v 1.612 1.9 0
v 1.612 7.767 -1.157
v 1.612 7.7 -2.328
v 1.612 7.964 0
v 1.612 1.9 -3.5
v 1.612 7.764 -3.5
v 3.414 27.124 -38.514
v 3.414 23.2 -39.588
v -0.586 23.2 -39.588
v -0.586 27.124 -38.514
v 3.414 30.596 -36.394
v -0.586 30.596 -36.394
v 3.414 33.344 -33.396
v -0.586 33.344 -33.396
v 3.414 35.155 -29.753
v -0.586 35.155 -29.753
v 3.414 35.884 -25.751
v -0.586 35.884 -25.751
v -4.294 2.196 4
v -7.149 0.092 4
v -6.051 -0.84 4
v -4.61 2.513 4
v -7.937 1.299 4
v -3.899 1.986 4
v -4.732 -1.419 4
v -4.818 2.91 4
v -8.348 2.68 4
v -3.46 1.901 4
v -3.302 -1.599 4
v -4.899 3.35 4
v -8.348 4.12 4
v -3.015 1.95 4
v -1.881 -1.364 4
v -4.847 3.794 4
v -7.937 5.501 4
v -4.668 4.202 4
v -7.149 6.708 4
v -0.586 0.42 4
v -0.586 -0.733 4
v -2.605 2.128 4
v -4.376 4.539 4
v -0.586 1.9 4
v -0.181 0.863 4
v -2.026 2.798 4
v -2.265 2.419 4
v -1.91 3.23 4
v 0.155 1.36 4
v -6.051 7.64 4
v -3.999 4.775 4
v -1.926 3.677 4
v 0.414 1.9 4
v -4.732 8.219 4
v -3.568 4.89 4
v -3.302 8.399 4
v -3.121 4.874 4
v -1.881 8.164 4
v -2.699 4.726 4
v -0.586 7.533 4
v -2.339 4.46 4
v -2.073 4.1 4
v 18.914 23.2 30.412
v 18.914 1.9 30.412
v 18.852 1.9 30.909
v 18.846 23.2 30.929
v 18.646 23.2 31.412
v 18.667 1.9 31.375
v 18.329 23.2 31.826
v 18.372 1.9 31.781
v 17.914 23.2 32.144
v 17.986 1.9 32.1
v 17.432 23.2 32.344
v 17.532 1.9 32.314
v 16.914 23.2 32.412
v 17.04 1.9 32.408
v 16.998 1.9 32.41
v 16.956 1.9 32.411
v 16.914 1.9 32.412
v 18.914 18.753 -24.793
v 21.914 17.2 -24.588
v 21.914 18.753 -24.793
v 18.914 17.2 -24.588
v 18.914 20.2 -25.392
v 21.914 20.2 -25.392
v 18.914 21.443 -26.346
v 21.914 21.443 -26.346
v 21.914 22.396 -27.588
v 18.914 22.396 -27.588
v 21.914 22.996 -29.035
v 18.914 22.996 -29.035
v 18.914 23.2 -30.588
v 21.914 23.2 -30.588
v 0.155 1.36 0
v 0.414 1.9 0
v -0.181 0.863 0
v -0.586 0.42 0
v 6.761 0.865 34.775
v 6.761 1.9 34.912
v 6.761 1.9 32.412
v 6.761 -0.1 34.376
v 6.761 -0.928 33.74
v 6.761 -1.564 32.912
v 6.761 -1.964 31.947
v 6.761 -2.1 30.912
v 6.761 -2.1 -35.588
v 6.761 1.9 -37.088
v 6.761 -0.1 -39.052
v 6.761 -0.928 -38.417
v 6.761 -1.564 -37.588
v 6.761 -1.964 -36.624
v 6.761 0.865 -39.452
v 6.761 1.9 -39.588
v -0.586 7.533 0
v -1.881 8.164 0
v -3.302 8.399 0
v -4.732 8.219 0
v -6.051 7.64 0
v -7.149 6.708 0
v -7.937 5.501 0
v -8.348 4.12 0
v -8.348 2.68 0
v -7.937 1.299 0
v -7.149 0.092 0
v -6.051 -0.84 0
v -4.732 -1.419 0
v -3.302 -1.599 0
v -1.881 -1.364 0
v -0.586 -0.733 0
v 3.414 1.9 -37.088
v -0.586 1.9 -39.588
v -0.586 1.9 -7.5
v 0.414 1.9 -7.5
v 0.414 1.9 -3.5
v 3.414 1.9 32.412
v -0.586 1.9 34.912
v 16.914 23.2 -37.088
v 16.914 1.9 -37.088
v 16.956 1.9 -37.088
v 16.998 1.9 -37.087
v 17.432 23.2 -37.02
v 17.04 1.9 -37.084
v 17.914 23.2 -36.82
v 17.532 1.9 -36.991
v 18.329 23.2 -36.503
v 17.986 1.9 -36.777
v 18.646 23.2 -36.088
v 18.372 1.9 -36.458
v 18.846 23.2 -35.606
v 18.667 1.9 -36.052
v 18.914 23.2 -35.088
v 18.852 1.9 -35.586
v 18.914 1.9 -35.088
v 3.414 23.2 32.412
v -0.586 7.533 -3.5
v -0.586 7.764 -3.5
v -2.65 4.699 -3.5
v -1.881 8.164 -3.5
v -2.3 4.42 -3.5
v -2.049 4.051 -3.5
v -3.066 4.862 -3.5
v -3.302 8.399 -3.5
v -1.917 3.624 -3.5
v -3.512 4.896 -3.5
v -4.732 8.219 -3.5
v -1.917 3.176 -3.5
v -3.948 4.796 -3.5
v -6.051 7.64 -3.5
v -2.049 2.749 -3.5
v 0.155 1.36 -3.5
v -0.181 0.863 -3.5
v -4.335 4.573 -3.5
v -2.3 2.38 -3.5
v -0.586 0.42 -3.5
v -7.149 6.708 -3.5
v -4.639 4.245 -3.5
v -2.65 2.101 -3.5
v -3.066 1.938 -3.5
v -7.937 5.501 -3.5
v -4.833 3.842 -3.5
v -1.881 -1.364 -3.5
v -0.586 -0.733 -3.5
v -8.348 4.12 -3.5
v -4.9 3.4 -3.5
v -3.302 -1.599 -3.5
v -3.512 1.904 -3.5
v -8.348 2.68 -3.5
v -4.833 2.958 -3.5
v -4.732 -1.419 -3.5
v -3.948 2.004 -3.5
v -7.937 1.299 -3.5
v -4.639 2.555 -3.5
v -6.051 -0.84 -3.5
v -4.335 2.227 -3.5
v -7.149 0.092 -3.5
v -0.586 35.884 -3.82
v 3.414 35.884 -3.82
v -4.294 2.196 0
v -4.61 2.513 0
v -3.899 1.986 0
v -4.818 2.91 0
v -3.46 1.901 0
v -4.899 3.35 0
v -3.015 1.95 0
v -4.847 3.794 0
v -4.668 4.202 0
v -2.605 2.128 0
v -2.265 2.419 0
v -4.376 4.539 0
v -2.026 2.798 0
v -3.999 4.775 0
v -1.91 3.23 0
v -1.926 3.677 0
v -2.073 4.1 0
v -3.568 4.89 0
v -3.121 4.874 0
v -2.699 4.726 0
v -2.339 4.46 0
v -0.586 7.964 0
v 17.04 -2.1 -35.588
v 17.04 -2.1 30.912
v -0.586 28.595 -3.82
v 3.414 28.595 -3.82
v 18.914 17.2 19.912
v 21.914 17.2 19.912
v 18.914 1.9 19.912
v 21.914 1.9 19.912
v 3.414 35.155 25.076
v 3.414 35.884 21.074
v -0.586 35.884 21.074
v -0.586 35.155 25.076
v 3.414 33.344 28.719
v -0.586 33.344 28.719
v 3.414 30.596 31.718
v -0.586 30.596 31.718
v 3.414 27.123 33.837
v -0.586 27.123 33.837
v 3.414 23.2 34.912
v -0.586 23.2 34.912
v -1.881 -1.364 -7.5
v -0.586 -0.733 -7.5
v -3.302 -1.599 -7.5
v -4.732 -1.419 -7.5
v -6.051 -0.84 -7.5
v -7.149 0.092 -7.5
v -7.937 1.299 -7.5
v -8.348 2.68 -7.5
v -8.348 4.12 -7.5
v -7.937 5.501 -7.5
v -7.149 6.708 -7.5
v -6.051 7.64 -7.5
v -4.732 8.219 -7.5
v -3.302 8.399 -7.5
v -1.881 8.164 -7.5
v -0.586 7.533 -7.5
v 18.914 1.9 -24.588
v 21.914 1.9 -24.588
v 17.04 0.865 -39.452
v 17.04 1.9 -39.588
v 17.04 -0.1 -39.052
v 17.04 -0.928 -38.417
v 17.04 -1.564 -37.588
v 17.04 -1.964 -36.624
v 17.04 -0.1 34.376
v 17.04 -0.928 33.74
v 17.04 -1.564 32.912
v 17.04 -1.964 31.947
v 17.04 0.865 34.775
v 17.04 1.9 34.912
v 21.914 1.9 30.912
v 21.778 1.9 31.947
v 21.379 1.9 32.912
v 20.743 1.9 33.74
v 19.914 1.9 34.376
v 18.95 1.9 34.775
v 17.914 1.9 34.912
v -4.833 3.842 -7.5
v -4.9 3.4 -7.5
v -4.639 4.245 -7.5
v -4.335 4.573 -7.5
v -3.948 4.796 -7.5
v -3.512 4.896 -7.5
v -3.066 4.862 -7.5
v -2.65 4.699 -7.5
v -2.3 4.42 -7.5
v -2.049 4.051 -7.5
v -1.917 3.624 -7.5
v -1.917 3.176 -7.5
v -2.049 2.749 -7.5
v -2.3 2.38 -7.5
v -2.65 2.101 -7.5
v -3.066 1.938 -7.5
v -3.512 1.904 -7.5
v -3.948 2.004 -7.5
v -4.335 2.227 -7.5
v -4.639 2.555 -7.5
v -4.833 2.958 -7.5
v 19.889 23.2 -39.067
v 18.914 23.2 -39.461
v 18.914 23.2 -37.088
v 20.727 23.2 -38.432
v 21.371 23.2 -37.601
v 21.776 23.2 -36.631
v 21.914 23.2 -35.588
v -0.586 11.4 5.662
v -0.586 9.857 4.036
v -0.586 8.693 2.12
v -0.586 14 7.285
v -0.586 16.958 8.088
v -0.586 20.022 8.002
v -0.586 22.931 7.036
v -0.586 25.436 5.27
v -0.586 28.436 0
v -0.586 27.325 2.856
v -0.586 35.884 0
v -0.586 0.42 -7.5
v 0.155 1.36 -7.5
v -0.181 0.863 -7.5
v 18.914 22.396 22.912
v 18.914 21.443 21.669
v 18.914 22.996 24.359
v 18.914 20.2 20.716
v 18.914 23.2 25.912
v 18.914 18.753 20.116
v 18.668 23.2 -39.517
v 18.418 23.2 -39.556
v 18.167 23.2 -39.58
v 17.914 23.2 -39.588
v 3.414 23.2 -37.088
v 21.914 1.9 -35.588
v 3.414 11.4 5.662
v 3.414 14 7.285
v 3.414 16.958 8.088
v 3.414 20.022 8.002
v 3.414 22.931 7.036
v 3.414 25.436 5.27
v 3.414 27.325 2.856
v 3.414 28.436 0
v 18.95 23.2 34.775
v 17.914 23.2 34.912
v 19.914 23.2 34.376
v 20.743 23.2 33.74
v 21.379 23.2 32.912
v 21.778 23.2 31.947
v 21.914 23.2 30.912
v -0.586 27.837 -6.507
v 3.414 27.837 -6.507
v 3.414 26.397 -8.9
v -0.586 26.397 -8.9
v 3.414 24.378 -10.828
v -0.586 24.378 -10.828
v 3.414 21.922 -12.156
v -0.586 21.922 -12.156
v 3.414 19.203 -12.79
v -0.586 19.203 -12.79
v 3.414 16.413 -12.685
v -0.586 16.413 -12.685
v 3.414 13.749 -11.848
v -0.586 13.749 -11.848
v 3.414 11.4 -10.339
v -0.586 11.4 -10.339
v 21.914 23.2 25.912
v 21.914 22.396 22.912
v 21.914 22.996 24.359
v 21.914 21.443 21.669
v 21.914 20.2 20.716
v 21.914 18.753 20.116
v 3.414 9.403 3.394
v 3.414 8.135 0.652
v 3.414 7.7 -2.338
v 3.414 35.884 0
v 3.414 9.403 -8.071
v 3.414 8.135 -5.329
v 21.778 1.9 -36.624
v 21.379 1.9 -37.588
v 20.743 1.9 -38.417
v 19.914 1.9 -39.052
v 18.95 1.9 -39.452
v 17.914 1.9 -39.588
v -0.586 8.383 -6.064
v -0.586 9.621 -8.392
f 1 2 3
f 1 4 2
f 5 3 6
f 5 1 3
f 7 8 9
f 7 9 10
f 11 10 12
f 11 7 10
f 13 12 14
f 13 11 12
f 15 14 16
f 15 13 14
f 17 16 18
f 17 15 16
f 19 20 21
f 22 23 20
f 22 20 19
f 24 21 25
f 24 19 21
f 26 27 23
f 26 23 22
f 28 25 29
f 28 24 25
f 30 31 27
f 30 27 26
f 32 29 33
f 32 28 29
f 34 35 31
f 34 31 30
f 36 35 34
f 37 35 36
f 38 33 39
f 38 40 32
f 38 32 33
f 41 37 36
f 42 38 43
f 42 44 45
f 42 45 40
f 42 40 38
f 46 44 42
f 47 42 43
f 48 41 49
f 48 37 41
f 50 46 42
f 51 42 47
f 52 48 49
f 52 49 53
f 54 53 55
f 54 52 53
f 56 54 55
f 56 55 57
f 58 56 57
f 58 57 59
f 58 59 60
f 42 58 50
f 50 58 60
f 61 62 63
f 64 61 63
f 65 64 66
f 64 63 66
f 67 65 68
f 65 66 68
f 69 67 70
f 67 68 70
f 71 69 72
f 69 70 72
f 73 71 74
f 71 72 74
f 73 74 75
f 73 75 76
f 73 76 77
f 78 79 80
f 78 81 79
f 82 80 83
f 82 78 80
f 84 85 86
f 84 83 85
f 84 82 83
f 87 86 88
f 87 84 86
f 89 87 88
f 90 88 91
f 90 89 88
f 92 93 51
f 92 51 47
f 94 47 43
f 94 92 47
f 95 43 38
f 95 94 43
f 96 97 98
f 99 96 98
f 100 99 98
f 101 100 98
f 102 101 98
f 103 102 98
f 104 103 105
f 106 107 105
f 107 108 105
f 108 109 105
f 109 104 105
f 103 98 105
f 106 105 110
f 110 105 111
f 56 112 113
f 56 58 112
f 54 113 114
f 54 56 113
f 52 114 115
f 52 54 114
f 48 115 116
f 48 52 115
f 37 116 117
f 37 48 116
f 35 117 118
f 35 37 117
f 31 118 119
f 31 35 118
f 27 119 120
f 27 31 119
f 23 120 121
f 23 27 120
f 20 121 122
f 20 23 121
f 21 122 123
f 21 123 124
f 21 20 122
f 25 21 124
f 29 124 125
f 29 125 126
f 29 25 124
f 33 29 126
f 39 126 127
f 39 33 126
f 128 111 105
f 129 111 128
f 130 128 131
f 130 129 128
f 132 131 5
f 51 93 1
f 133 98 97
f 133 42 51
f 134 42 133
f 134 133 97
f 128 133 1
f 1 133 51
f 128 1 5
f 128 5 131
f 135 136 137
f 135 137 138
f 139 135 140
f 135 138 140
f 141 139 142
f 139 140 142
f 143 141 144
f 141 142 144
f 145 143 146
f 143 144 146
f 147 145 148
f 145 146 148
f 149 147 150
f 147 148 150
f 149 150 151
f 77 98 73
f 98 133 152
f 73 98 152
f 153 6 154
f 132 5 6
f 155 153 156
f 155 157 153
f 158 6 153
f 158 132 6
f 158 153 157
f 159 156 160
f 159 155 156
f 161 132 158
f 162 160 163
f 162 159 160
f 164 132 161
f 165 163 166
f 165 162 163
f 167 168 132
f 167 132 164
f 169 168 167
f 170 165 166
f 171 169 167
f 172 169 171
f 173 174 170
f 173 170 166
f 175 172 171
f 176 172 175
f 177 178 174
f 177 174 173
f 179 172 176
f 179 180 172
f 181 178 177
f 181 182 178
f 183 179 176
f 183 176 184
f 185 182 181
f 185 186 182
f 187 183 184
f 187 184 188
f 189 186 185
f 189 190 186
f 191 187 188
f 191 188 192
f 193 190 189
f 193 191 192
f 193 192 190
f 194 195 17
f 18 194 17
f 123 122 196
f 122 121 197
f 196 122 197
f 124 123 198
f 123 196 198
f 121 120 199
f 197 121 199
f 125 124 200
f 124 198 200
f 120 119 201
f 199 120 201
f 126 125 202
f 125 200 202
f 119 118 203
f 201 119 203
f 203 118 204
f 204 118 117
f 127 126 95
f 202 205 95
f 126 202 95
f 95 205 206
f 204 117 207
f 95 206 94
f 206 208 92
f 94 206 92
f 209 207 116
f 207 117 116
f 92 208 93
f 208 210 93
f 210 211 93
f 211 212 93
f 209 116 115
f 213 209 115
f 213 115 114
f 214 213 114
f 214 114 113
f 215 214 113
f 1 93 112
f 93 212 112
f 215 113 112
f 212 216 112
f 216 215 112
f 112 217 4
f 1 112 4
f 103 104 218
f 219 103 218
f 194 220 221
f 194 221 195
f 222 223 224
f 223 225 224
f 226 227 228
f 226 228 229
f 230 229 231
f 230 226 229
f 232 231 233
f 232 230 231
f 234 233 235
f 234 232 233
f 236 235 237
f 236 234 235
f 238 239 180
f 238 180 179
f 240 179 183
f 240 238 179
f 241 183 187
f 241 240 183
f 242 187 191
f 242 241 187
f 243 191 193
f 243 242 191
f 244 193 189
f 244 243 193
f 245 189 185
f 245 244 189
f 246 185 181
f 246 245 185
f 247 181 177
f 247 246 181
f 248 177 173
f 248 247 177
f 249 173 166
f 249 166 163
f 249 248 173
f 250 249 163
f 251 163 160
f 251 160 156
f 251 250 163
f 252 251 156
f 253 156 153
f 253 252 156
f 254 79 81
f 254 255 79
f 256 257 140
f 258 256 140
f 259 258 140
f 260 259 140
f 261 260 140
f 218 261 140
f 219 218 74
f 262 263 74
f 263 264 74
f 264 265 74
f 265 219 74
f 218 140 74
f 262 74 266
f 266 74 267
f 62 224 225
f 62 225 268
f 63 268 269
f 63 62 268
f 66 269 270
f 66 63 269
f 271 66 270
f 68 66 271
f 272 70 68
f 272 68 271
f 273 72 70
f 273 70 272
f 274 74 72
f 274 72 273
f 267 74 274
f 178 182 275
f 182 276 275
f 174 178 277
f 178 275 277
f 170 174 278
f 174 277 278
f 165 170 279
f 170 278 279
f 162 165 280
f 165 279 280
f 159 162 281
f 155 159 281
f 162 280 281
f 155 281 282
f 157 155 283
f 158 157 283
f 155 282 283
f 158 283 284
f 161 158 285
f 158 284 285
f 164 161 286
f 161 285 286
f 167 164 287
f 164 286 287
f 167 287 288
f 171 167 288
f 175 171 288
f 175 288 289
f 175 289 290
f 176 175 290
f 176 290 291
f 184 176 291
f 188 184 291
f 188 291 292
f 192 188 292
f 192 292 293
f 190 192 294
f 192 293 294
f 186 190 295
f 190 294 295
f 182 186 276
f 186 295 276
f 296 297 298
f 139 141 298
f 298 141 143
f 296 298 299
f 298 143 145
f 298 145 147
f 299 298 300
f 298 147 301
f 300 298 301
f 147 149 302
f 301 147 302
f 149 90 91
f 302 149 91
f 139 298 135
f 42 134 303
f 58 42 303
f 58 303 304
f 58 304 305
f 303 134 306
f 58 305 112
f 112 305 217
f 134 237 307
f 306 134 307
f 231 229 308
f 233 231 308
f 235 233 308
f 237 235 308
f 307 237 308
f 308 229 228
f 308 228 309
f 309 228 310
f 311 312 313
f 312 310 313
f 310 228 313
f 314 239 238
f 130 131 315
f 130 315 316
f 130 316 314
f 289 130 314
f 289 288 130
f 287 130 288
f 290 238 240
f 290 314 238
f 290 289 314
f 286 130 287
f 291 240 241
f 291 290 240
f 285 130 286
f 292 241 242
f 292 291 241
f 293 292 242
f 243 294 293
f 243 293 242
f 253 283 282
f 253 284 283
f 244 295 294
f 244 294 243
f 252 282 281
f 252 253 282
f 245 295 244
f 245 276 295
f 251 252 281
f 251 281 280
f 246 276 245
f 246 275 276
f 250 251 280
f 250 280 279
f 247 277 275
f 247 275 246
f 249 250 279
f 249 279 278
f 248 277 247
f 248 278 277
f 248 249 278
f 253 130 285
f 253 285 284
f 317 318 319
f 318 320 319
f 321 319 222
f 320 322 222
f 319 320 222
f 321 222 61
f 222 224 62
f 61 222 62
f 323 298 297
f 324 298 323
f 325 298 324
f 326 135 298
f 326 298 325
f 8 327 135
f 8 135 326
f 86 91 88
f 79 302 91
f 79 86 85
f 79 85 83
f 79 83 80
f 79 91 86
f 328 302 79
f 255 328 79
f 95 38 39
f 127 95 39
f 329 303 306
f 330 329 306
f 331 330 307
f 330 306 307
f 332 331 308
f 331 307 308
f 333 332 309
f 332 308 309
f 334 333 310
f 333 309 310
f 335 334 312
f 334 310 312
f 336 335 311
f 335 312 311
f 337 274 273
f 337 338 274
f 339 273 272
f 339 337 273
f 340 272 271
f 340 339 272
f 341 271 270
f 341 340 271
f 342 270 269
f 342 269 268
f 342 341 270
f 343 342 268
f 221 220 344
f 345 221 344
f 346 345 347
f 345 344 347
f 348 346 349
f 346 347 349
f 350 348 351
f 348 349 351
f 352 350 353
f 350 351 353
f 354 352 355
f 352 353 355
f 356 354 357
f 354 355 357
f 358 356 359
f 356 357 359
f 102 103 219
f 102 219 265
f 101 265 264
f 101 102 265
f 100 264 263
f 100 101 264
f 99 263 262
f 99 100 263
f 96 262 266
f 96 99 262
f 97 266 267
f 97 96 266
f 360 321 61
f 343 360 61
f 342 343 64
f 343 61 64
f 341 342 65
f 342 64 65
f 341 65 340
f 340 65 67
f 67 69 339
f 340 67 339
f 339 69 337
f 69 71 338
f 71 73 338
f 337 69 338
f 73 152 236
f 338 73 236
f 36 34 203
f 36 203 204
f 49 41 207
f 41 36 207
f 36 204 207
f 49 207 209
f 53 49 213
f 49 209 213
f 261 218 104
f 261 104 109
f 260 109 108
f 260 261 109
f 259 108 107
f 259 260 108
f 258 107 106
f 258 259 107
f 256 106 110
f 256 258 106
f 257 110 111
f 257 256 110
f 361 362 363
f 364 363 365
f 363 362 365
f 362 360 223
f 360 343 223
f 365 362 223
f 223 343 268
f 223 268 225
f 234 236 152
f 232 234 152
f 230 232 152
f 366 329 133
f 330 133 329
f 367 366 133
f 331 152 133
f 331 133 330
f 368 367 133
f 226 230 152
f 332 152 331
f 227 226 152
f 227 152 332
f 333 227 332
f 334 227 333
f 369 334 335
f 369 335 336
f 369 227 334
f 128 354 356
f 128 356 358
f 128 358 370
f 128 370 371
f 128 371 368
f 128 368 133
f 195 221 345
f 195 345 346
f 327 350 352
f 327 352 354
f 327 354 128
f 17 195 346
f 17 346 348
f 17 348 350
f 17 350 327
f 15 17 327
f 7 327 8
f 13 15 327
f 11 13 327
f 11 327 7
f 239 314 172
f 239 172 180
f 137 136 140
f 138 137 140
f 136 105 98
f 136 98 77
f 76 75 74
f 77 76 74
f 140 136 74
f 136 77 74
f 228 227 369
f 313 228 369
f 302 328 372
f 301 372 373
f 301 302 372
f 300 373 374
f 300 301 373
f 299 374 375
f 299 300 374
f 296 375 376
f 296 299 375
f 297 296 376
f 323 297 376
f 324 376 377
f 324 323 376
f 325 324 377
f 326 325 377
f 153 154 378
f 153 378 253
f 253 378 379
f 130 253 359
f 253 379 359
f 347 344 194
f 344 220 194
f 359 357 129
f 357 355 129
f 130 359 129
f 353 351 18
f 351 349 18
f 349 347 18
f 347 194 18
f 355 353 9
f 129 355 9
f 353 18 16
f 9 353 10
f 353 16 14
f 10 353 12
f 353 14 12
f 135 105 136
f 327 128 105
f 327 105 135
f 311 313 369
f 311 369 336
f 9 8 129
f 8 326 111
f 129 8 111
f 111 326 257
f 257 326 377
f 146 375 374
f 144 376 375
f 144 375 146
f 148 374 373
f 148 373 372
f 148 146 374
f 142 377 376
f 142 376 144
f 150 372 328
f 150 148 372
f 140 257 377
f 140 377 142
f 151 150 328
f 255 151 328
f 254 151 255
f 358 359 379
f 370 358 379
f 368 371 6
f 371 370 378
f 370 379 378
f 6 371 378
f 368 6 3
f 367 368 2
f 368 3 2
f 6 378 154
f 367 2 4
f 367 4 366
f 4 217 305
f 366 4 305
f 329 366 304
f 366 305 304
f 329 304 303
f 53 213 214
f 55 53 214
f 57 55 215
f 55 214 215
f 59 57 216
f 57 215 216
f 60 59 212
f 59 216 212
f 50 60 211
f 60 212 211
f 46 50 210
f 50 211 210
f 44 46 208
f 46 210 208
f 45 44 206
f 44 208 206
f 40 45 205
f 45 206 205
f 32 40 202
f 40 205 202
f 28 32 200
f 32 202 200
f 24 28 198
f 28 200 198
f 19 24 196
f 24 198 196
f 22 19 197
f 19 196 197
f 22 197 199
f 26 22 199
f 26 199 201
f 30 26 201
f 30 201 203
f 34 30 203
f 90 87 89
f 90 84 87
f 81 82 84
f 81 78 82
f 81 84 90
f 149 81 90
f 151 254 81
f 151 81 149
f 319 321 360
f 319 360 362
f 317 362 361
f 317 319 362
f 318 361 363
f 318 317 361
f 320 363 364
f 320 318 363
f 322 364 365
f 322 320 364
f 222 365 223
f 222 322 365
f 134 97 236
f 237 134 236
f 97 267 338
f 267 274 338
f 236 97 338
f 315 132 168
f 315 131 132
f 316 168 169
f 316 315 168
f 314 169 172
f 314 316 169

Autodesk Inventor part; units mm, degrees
ref_plane "YZ Plane" through (0, 0, 0) normal (1, 0, 0) x (0, 1, 0)
ref_plane "XZ Plane" through (0, 0, 0) normal (0, 1, 0) x (-1, 0, 0)
ref_plane "XY Plane" through (0, 0, 0) normal (0, 0, 1) x (1, 0, 0)
sketch "Эскиз1" plane through (0, 0, 0) normal (0, 0, 1) x (1, 0, 0)
  arc A0 (-3.5681, 4.8905) -> (-4.8473, 3.794) centre (-3.4, 3.4) ccw projected
  circle A1 centre (-3.4, 3.4) radius 1.5
  arc A2 (0.4144, 4.9) -> (0.4144, 1.9) centre (-3.4, 3.4) ccw
  line L0 (0.4144, 4.9) -> (0.4144, 1.9)
  point P0 (0, 0)
  point P1 (-4.8473, 3.794)
  point P2 (-3.5681, 4.8905)
extrude "Выдавливание1" add sketch "Эскиз1" along normal blind 4
sketch "Эскиз2" plane through (0.4144, 1.9, 0) normal (1, 0, 0) x (0, 0, -1)
  line L0 (0, 0) -> (0, 3) projected
  line L1 (0, 3) -> (-4, 3) projected
  line L2 (-4, 0) -> (-4, 3) projected
  line L3 (0, 0) -> (-4, 0) projected
  line L4 (0, 3) -> (-4, 3) projected
  line L5 (-4, 3) -> (7.5, 3)
  line L6 (7.5, 3) -> (7.5, 0)
  line L7 (7.5, 0) -> (-4, 0)
  line L8 (-4, 0) -> (-4, 3)
  point P0 (0, -1.9)
  point P1 (3, 1.9)
  dimension "d2" = 4
  dimension "d3" = 4.5
extrude "Выдавливание2" add sketch "Эскиз2" along normal blind 3
sketch "Эскиз3" plane through (0.4144, 1.9, -7.5) normal (0, 0, -1) x (-1, 0, 0)
  line L0 (0, 0) -> (0, 3) projected
  arc A0 (0, 0) -> (0, 3) centre (3.8144, 1.5) ccw projected
  circle A1 centre (3.8144, 1.5) radius 1.5 projected
  point P0 (0.4144, -1.9)
extrude "Выдавливание3" add sketch "Эскиз3" against normal blind 4
sketch "Эскиз4" plane through (3.4144, 1.9, 0) normal (1, 0, 0) x (0, 0, -1)
  line L0 (6.3383, 0) -> (-1.6617, 0) projected
  line L1 (39.5883, 0) -> (-34.9117, 0)
  line L2 (-34.9117, 0) -> (-34.9117, 21.3)
  line L3 (-21.0745, 33.9845) -> (25.7512, 33.9845)
  line L4 (39.5883, 21.3002) -> (39.5883, 0)
  line L5 (-31.9117, 21.3) -> (-31.9117, 4.3) projected
  line L6 (36.5883, 4.3) -> (36.5883, 21.3) projected
  line L7 (24.5883, 33.3) -> (-19.9117, 33.3) projected
  arc A0 (-19.9117, 33.9845) -> (-34.9117, 21.3) centre (-20.4931, 19.4607) ccw
  circle A1 centre (2.3383, 16.3) radius 0.9967 projected
  line L8 (2.3383, 16.3) -> (2.3383, 42.847) construction
  arc A2 (39.5883, 21.3) -> (24.5883, 33.9845) centre (25.1697, 19.4607) ccw
  point P0 (0, -1.9)
  point P1 (-1.6617, 0)
  dimension "d8" = 3
  dimension "d9" = 3
extrude "Выдавливание4" add sketch "Эскиз4" against normal blind 4 contours L0 L1 L2 A0 L3 A2 L4
sketch "Эскиз5" plane through (-0.5856, 1.9, 0) normal (-1, 0, 0) x (0, 0, 1)
  arc A0 (-10.3389, 9.5) -> (5.6623, 9.5) centre (-2.3383, 16.3) ccw projected
  circle A1 centre (-2.3383, 16.3) radius 0.9967 projected
  circle A2 centre (-2.3383, 16.3) radius 10.5
  point P0 (0, -1.9)
  point P1 (5.6623, 9.5)
  point P2 (-10.3389, 9.5)
extrude "Выдавливание5" cut sketch "Эскиз5" against normal blind 4
sketch "Эскиз6" plane through (3.4144, 1.9, 0) normal (1, 0, 0) x (0, 0, -1)
  circle A0 centre (2.3383, 16.3) radius 10.5 projected
  line L0 (-34.9117, 0) -> (39.5883, 0) projected
  line L1 (39.5883, 0) -> (39.5883, 21.3002) projected
  arc A1 (39.5883, 21.3002) -> (25.7512, 33.9845) centre (25.1697, 19.4607) ccw projected
  line L2 (25.7512, 33.9845) -> (-21.0745, 33.9845) projected
  arc A2 (-21.0745, 33.9845) -> (-34.9117, 21.3) centre (-20.4931, 19.4607) ccw projected
  line L3 (-34.9117, 21.3) -> (-34.9117, 0) projected
  line L4 (-34.9117, 0) -> (-32.4117, 0)
  line L5 (-32.4117, 0) -> (-32.4117, 21.3)
  line L6 (-32.4117, 21.3) -> (-34.9117, 21.3)
  line L7 (-34.9117, 21.3) -> (-34.9117, 0)
  line L8 (39.5883, 0) -> (39.5883, 21.3002) projected
  line L9 (39.5883, 0) -> (37.0883, 0)
  line L10 (37.0883, 0) -> (37.0883, 21.3)
  line L11 (37.0883, 21.3) -> (39.5883, 21.3)
  line L12 (39.5883, 21.3) -> (39.5883, 0)
  point P0 (0, -1.9)
  dimension "d14" = 2.5
  dimension "d15" = 2.5
extrude "Выдавливание6" add sketch "Эскиз6" along normal blind 15.5 contours L3 L6 L5 L0 | L10 L11 L1 L0
sketch "Эскиз7" plane through (-0.5856, 1.9, 0) normal (-1, 0, 0) x (0, 0, 1)
  circle A0 centre (-2.3383, 16.3) radius 10.5 projected
  line L0 (-3.82, 35.4662) -> (0, 35.4662)
  line L1 (0, 35.4662) -> (0, 24.6625)
  line L2 (0, 24.6625) -> (-3.82, 24.6625)
  line L3 (-3.82, 24.6625) -> (-3.82, 35.4662)
  point P0 (0, -1.9)
  point P1 (-3.82, 26.6949)
  point P2 (0, 26.5363)
extrude "Выдавливание7" cut sketch "Эскиз7" against normal blind 15.5 contours A0 L3 L0 L1
sketch "Эскиз8" plane through (0.4144, 1.9, 0) normal (0, -1, 0) x (1, 0, 0)
  line L0 (3, 32.4117) -> (18.5, 32.4117) projected
  line L1 (3, -37.0883) -> (18.5, -37.0883) projected
  line L2 (16.6252, 32.4117) -> (6.3462, 32.4117)
  line L3 (6.3462, 32.4117) -> (6.3462, -37.0883)
  line L4 (6.3462, -37.0883) -> (16.6252, -37.0883)
  line L5 (16.6252, -37.0883) -> (16.6252, 32.4117)
  line L6 (18.5, 34.9117) -> (-1, 34.9117) projected
  line L7 (16.6252, 34.9117) -> (6.3462, 34.9117)
  line L8 (6.3462, 34.9117) -> (6.3462, 32.4117)
  line L9 (6.3462, 32.4117) -> (16.6252, 32.4117)
  line L10 (16.6252, 32.4117) -> (16.6252, 34.9117)
  line L11 (-1, -39.5883) -> (18.5, -39.5883) projected
  line L12 (16.6252, -37.0883) -> (6.3462, -37.0883)
  line L13 (6.3462, -37.0883) -> (6.3462, -39.5883)
  line L14 (6.3462, -39.5883) -> (16.6252, -39.5883)
  line L15 (16.6252, -39.5883) -> (16.6252, -37.0883)
  point P0 (-0.4144, 0)
  point P1 (6.3462, -37.0883)
extrude "Выдавливание8" add sketch "Эскиз8" along normal blind 4
fillet "Сопряжение1" radius 4 2 edges at (11.9001, -2.1, -39.5883) (11.9001, -2.1, 34.9117)
sketch "Эскиз9" plane through (18.9144, 1.9, -39.5883) normal (0, -1, 0) x (1, 0, 0)
  line L0 (-15.5, 74.5) -> (0, 74.5) projected
  line L1 (0, 74.5) -> (3, 74.5)
  line L2 (3, 74.5) -> (3, 59.5)
  line L3 (3, 59.5) -> (0, 59.5)
  line L4 (0, 59.5) -> (0, 74.5)
  line L5 (0, 2.5) -> (0, 0) projected
  line L6 (0, 0) -> (3, 0)
  line L7 (3, 0) -> (3, 15)
  line L8 (3, 15) -> (0, 15)
  line L9 (0, 15) -> (0, 0)
  point P0 (-18.9144, 39.5883)
  dimension "d23" = 3
  dimension "d24" = 15
  dimension "d25" = 15
extrude "Выдавливание9" add sketch "Эскиз9" against normal blind 21.3
fillet "Сопряжение2" radius 4 2 edges at (21.9144, 12.55, -39.5883) (21.9144, 12.55, 34.9117)
fillet "Сопряжение3" radius 2 2 edges at (18.9144, 12.55, 32.4117) (18.9144, 12.55, -37.0883)
fillet "Сопряжение4" radius 6 2 edges at (20.4144, 23.2, 19.9117) (20.4144, 23.2, -24.5883)
sketch "Эскиз10" plane through (0.4144, 1.9, -7.5) normal (0, 0, -1) x (-1, 0, 0)
  circle A0 centre (3.8144, 1.5) radius 1.5 projected
  arc A1 (0, 0) -> (1, 4.4797) centre (3.8144, 1.5) ccw projected
  arc A2 (1, -2.6327) -> (1, 5.6327) centre (3.8144, 1.5) ccw
  line L0 (1, 0) -> (1, 21.3) projected
  line L1 (1, 6.5) -> (1, -2.6327)
  point P0 (0.4144, -1.9)
  point P1 (1, -1.4797)
  dimension "d31" = 10
extrude "Выдавливание10" add sketch "Эскиз10" against normal blind 4 contours A1 L0 A2 L1
sketch "Эскиз11" plane through (0, 0, 4) normal (0, 0, 1) x (1, 0, 0)
  arc A0 (-0.5856, 7.5327) -> (-0.5856, -0.7327) centre (-3.4, 3.4) ccw projected
  circle A1 centre (-3.4, 3.4) radius 1.5 projected
  circle A2 centre (-3.4, 3.4) radius 5
  line L0 (-0.5856, 1.9) -> (-0.5856, 7.5327) projected
  line L1 (-0.5856, 7.5327) -> (-0.5856, -0.7327)
  circle A3 centre (-3.4, 3.4) radius 1.5 projected
  line L2 (0.4144, 1.9) -> (-0.5856, 1.9) projected
  line L3 (-0.5856, 1.9) -> (-0.5856, 6.3797) projected
  arc A4 (-0.5856, 6.3797) -> (0.4144, 1.9) centre (-3.4, 3.4) ccw projected
  point P0 (0, 0)
  point P1 (-0.5856, 0.4203)
extrude "Выдавливание11" add sketch "Эскиз11" against normal blind 4 contours L0 A4 L1 A0
sketch "Эскиз12" plane through (0.4144, -2.1, 0) normal (0, -1, 0) x (1, 0, 0)
  line L0 (-1, -3.5) -> (-1, 0) projected
  line L1 (3, 0) -> (-1, 0) projected
  line L2 (-1, 0) -> (1.1974, 0)
  line L3 (1.1974, 0) -> (1.1974, -3.5)
  line L4 (1.1974, -3.5) -> (-1, -3.5)
  line L5 (-1, -3.5) -> (-1, 0)
  point P0 (-0.4144, 0)
extrude "Выдавливание12" cut sketch "Эскиз12" against normal blind 21.5
properties part number "cam_hold_logitech"
